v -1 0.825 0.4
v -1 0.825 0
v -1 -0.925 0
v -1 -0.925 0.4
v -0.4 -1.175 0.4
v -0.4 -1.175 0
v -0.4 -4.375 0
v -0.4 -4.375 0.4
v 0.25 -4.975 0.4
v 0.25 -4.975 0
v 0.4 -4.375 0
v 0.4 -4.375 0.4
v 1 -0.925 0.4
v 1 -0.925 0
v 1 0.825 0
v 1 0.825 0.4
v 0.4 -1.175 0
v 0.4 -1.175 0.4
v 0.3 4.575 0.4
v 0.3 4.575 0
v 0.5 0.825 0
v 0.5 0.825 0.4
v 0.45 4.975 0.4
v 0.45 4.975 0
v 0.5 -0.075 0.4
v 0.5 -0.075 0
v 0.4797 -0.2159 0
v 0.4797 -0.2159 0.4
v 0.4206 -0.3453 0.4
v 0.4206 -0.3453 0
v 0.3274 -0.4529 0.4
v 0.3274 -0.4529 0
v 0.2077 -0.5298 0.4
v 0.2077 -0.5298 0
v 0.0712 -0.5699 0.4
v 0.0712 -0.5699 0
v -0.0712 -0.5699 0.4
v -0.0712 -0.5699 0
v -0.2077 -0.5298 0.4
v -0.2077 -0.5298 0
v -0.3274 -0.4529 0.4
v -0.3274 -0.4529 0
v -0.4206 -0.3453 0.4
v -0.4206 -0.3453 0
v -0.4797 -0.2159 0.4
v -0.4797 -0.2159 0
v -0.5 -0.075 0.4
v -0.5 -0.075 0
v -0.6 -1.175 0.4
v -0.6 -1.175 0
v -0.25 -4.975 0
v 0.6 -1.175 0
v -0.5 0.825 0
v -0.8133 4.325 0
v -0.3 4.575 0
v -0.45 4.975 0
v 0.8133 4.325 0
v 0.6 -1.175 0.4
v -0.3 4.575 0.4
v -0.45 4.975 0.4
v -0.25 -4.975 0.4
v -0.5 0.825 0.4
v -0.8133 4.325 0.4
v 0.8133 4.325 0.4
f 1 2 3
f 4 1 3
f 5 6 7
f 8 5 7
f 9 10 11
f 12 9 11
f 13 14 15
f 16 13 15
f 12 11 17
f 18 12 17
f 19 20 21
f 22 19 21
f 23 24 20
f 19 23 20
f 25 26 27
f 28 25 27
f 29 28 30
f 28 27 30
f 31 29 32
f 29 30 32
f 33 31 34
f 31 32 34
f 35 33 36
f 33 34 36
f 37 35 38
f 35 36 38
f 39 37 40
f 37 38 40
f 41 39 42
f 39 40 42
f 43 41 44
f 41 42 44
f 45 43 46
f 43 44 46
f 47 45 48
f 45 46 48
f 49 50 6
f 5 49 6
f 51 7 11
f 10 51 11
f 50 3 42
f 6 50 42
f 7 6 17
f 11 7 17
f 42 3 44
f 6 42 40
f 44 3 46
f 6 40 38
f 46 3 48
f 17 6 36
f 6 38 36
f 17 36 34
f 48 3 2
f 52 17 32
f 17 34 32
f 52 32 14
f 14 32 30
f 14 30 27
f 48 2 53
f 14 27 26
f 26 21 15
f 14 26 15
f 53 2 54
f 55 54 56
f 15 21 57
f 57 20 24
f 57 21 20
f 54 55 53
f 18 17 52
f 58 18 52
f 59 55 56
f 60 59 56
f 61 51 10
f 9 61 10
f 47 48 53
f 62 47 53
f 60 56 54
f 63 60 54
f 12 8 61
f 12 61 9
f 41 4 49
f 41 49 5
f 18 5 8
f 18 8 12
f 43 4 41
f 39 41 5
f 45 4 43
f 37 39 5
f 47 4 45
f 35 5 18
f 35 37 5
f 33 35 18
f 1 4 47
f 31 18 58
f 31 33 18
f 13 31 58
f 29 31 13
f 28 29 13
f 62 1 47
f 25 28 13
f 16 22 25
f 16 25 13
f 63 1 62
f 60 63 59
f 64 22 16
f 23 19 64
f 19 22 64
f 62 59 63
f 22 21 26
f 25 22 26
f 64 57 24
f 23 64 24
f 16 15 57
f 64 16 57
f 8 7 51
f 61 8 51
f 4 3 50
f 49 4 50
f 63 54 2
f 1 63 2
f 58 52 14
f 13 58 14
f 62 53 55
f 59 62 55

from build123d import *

# Parameters (mm, degrees)
DODANIE_WYCI_GNI_CIE1_DEPTH = 0.4


with BuildPart() as part:
    # Szkic1 → Dodanie-wyciągnięcie1 (new body)
    with BuildSketch(Plane.XY):
        with BuildLine():
            Line((0.25, -4.975), (0.4, -4.375))
            Line((0.4, -4.375), (0.4, -1.175))
            Line((0.4, -1.175), (0.6, -1.175))
            Line((0.6, -1.175), (1, -0.925))
            Line((1, -0.925), (1, 0.825))
            Line((1, 0.825), (0.813333333, 4.325))
            Line((0.813333333, 4.325), (0.45, 4.975))
            Line((0.45, 4.975), (0.3, 4.575))
            Line((0.3, 4.575), (0.5, 0.825))
            Line((0.5, 0.825), (0.5, -0.075))
            ThreePointArc((0.5, -0.075), (0, -0.575), (-0.5, -0.075))
            Line((-0.5, -0.075), (-0.5, 0.825))
            Line((-0.5, 0.825), (-0.3, 4.575))
            Line((-0.3, 4.575), (-0.45, 4.975))
            Line((-0.45, 4.975), (-0.813333333, 4.325))
            Line((-0.813333333, 4.325), (-1, 0.825))
            Line((-1, 0.825), (-1, -0.925))
            Line((-1, -0.925), (-0.6, -1.175))
            Line((-0.6, -1.175), (-0.4, -1.175))
            Line((-0.4, -1.175), (-0.4, -4.375))
            Line((-0.4, -4.375), (-0.25, -4.975))
            Line((-0.25, -4.975), (0.25, -4.975))
        make_face()
    extrude(amount=DODANIE_WYCI_GNI_CIE1_DEPTH)


solid = part.part
